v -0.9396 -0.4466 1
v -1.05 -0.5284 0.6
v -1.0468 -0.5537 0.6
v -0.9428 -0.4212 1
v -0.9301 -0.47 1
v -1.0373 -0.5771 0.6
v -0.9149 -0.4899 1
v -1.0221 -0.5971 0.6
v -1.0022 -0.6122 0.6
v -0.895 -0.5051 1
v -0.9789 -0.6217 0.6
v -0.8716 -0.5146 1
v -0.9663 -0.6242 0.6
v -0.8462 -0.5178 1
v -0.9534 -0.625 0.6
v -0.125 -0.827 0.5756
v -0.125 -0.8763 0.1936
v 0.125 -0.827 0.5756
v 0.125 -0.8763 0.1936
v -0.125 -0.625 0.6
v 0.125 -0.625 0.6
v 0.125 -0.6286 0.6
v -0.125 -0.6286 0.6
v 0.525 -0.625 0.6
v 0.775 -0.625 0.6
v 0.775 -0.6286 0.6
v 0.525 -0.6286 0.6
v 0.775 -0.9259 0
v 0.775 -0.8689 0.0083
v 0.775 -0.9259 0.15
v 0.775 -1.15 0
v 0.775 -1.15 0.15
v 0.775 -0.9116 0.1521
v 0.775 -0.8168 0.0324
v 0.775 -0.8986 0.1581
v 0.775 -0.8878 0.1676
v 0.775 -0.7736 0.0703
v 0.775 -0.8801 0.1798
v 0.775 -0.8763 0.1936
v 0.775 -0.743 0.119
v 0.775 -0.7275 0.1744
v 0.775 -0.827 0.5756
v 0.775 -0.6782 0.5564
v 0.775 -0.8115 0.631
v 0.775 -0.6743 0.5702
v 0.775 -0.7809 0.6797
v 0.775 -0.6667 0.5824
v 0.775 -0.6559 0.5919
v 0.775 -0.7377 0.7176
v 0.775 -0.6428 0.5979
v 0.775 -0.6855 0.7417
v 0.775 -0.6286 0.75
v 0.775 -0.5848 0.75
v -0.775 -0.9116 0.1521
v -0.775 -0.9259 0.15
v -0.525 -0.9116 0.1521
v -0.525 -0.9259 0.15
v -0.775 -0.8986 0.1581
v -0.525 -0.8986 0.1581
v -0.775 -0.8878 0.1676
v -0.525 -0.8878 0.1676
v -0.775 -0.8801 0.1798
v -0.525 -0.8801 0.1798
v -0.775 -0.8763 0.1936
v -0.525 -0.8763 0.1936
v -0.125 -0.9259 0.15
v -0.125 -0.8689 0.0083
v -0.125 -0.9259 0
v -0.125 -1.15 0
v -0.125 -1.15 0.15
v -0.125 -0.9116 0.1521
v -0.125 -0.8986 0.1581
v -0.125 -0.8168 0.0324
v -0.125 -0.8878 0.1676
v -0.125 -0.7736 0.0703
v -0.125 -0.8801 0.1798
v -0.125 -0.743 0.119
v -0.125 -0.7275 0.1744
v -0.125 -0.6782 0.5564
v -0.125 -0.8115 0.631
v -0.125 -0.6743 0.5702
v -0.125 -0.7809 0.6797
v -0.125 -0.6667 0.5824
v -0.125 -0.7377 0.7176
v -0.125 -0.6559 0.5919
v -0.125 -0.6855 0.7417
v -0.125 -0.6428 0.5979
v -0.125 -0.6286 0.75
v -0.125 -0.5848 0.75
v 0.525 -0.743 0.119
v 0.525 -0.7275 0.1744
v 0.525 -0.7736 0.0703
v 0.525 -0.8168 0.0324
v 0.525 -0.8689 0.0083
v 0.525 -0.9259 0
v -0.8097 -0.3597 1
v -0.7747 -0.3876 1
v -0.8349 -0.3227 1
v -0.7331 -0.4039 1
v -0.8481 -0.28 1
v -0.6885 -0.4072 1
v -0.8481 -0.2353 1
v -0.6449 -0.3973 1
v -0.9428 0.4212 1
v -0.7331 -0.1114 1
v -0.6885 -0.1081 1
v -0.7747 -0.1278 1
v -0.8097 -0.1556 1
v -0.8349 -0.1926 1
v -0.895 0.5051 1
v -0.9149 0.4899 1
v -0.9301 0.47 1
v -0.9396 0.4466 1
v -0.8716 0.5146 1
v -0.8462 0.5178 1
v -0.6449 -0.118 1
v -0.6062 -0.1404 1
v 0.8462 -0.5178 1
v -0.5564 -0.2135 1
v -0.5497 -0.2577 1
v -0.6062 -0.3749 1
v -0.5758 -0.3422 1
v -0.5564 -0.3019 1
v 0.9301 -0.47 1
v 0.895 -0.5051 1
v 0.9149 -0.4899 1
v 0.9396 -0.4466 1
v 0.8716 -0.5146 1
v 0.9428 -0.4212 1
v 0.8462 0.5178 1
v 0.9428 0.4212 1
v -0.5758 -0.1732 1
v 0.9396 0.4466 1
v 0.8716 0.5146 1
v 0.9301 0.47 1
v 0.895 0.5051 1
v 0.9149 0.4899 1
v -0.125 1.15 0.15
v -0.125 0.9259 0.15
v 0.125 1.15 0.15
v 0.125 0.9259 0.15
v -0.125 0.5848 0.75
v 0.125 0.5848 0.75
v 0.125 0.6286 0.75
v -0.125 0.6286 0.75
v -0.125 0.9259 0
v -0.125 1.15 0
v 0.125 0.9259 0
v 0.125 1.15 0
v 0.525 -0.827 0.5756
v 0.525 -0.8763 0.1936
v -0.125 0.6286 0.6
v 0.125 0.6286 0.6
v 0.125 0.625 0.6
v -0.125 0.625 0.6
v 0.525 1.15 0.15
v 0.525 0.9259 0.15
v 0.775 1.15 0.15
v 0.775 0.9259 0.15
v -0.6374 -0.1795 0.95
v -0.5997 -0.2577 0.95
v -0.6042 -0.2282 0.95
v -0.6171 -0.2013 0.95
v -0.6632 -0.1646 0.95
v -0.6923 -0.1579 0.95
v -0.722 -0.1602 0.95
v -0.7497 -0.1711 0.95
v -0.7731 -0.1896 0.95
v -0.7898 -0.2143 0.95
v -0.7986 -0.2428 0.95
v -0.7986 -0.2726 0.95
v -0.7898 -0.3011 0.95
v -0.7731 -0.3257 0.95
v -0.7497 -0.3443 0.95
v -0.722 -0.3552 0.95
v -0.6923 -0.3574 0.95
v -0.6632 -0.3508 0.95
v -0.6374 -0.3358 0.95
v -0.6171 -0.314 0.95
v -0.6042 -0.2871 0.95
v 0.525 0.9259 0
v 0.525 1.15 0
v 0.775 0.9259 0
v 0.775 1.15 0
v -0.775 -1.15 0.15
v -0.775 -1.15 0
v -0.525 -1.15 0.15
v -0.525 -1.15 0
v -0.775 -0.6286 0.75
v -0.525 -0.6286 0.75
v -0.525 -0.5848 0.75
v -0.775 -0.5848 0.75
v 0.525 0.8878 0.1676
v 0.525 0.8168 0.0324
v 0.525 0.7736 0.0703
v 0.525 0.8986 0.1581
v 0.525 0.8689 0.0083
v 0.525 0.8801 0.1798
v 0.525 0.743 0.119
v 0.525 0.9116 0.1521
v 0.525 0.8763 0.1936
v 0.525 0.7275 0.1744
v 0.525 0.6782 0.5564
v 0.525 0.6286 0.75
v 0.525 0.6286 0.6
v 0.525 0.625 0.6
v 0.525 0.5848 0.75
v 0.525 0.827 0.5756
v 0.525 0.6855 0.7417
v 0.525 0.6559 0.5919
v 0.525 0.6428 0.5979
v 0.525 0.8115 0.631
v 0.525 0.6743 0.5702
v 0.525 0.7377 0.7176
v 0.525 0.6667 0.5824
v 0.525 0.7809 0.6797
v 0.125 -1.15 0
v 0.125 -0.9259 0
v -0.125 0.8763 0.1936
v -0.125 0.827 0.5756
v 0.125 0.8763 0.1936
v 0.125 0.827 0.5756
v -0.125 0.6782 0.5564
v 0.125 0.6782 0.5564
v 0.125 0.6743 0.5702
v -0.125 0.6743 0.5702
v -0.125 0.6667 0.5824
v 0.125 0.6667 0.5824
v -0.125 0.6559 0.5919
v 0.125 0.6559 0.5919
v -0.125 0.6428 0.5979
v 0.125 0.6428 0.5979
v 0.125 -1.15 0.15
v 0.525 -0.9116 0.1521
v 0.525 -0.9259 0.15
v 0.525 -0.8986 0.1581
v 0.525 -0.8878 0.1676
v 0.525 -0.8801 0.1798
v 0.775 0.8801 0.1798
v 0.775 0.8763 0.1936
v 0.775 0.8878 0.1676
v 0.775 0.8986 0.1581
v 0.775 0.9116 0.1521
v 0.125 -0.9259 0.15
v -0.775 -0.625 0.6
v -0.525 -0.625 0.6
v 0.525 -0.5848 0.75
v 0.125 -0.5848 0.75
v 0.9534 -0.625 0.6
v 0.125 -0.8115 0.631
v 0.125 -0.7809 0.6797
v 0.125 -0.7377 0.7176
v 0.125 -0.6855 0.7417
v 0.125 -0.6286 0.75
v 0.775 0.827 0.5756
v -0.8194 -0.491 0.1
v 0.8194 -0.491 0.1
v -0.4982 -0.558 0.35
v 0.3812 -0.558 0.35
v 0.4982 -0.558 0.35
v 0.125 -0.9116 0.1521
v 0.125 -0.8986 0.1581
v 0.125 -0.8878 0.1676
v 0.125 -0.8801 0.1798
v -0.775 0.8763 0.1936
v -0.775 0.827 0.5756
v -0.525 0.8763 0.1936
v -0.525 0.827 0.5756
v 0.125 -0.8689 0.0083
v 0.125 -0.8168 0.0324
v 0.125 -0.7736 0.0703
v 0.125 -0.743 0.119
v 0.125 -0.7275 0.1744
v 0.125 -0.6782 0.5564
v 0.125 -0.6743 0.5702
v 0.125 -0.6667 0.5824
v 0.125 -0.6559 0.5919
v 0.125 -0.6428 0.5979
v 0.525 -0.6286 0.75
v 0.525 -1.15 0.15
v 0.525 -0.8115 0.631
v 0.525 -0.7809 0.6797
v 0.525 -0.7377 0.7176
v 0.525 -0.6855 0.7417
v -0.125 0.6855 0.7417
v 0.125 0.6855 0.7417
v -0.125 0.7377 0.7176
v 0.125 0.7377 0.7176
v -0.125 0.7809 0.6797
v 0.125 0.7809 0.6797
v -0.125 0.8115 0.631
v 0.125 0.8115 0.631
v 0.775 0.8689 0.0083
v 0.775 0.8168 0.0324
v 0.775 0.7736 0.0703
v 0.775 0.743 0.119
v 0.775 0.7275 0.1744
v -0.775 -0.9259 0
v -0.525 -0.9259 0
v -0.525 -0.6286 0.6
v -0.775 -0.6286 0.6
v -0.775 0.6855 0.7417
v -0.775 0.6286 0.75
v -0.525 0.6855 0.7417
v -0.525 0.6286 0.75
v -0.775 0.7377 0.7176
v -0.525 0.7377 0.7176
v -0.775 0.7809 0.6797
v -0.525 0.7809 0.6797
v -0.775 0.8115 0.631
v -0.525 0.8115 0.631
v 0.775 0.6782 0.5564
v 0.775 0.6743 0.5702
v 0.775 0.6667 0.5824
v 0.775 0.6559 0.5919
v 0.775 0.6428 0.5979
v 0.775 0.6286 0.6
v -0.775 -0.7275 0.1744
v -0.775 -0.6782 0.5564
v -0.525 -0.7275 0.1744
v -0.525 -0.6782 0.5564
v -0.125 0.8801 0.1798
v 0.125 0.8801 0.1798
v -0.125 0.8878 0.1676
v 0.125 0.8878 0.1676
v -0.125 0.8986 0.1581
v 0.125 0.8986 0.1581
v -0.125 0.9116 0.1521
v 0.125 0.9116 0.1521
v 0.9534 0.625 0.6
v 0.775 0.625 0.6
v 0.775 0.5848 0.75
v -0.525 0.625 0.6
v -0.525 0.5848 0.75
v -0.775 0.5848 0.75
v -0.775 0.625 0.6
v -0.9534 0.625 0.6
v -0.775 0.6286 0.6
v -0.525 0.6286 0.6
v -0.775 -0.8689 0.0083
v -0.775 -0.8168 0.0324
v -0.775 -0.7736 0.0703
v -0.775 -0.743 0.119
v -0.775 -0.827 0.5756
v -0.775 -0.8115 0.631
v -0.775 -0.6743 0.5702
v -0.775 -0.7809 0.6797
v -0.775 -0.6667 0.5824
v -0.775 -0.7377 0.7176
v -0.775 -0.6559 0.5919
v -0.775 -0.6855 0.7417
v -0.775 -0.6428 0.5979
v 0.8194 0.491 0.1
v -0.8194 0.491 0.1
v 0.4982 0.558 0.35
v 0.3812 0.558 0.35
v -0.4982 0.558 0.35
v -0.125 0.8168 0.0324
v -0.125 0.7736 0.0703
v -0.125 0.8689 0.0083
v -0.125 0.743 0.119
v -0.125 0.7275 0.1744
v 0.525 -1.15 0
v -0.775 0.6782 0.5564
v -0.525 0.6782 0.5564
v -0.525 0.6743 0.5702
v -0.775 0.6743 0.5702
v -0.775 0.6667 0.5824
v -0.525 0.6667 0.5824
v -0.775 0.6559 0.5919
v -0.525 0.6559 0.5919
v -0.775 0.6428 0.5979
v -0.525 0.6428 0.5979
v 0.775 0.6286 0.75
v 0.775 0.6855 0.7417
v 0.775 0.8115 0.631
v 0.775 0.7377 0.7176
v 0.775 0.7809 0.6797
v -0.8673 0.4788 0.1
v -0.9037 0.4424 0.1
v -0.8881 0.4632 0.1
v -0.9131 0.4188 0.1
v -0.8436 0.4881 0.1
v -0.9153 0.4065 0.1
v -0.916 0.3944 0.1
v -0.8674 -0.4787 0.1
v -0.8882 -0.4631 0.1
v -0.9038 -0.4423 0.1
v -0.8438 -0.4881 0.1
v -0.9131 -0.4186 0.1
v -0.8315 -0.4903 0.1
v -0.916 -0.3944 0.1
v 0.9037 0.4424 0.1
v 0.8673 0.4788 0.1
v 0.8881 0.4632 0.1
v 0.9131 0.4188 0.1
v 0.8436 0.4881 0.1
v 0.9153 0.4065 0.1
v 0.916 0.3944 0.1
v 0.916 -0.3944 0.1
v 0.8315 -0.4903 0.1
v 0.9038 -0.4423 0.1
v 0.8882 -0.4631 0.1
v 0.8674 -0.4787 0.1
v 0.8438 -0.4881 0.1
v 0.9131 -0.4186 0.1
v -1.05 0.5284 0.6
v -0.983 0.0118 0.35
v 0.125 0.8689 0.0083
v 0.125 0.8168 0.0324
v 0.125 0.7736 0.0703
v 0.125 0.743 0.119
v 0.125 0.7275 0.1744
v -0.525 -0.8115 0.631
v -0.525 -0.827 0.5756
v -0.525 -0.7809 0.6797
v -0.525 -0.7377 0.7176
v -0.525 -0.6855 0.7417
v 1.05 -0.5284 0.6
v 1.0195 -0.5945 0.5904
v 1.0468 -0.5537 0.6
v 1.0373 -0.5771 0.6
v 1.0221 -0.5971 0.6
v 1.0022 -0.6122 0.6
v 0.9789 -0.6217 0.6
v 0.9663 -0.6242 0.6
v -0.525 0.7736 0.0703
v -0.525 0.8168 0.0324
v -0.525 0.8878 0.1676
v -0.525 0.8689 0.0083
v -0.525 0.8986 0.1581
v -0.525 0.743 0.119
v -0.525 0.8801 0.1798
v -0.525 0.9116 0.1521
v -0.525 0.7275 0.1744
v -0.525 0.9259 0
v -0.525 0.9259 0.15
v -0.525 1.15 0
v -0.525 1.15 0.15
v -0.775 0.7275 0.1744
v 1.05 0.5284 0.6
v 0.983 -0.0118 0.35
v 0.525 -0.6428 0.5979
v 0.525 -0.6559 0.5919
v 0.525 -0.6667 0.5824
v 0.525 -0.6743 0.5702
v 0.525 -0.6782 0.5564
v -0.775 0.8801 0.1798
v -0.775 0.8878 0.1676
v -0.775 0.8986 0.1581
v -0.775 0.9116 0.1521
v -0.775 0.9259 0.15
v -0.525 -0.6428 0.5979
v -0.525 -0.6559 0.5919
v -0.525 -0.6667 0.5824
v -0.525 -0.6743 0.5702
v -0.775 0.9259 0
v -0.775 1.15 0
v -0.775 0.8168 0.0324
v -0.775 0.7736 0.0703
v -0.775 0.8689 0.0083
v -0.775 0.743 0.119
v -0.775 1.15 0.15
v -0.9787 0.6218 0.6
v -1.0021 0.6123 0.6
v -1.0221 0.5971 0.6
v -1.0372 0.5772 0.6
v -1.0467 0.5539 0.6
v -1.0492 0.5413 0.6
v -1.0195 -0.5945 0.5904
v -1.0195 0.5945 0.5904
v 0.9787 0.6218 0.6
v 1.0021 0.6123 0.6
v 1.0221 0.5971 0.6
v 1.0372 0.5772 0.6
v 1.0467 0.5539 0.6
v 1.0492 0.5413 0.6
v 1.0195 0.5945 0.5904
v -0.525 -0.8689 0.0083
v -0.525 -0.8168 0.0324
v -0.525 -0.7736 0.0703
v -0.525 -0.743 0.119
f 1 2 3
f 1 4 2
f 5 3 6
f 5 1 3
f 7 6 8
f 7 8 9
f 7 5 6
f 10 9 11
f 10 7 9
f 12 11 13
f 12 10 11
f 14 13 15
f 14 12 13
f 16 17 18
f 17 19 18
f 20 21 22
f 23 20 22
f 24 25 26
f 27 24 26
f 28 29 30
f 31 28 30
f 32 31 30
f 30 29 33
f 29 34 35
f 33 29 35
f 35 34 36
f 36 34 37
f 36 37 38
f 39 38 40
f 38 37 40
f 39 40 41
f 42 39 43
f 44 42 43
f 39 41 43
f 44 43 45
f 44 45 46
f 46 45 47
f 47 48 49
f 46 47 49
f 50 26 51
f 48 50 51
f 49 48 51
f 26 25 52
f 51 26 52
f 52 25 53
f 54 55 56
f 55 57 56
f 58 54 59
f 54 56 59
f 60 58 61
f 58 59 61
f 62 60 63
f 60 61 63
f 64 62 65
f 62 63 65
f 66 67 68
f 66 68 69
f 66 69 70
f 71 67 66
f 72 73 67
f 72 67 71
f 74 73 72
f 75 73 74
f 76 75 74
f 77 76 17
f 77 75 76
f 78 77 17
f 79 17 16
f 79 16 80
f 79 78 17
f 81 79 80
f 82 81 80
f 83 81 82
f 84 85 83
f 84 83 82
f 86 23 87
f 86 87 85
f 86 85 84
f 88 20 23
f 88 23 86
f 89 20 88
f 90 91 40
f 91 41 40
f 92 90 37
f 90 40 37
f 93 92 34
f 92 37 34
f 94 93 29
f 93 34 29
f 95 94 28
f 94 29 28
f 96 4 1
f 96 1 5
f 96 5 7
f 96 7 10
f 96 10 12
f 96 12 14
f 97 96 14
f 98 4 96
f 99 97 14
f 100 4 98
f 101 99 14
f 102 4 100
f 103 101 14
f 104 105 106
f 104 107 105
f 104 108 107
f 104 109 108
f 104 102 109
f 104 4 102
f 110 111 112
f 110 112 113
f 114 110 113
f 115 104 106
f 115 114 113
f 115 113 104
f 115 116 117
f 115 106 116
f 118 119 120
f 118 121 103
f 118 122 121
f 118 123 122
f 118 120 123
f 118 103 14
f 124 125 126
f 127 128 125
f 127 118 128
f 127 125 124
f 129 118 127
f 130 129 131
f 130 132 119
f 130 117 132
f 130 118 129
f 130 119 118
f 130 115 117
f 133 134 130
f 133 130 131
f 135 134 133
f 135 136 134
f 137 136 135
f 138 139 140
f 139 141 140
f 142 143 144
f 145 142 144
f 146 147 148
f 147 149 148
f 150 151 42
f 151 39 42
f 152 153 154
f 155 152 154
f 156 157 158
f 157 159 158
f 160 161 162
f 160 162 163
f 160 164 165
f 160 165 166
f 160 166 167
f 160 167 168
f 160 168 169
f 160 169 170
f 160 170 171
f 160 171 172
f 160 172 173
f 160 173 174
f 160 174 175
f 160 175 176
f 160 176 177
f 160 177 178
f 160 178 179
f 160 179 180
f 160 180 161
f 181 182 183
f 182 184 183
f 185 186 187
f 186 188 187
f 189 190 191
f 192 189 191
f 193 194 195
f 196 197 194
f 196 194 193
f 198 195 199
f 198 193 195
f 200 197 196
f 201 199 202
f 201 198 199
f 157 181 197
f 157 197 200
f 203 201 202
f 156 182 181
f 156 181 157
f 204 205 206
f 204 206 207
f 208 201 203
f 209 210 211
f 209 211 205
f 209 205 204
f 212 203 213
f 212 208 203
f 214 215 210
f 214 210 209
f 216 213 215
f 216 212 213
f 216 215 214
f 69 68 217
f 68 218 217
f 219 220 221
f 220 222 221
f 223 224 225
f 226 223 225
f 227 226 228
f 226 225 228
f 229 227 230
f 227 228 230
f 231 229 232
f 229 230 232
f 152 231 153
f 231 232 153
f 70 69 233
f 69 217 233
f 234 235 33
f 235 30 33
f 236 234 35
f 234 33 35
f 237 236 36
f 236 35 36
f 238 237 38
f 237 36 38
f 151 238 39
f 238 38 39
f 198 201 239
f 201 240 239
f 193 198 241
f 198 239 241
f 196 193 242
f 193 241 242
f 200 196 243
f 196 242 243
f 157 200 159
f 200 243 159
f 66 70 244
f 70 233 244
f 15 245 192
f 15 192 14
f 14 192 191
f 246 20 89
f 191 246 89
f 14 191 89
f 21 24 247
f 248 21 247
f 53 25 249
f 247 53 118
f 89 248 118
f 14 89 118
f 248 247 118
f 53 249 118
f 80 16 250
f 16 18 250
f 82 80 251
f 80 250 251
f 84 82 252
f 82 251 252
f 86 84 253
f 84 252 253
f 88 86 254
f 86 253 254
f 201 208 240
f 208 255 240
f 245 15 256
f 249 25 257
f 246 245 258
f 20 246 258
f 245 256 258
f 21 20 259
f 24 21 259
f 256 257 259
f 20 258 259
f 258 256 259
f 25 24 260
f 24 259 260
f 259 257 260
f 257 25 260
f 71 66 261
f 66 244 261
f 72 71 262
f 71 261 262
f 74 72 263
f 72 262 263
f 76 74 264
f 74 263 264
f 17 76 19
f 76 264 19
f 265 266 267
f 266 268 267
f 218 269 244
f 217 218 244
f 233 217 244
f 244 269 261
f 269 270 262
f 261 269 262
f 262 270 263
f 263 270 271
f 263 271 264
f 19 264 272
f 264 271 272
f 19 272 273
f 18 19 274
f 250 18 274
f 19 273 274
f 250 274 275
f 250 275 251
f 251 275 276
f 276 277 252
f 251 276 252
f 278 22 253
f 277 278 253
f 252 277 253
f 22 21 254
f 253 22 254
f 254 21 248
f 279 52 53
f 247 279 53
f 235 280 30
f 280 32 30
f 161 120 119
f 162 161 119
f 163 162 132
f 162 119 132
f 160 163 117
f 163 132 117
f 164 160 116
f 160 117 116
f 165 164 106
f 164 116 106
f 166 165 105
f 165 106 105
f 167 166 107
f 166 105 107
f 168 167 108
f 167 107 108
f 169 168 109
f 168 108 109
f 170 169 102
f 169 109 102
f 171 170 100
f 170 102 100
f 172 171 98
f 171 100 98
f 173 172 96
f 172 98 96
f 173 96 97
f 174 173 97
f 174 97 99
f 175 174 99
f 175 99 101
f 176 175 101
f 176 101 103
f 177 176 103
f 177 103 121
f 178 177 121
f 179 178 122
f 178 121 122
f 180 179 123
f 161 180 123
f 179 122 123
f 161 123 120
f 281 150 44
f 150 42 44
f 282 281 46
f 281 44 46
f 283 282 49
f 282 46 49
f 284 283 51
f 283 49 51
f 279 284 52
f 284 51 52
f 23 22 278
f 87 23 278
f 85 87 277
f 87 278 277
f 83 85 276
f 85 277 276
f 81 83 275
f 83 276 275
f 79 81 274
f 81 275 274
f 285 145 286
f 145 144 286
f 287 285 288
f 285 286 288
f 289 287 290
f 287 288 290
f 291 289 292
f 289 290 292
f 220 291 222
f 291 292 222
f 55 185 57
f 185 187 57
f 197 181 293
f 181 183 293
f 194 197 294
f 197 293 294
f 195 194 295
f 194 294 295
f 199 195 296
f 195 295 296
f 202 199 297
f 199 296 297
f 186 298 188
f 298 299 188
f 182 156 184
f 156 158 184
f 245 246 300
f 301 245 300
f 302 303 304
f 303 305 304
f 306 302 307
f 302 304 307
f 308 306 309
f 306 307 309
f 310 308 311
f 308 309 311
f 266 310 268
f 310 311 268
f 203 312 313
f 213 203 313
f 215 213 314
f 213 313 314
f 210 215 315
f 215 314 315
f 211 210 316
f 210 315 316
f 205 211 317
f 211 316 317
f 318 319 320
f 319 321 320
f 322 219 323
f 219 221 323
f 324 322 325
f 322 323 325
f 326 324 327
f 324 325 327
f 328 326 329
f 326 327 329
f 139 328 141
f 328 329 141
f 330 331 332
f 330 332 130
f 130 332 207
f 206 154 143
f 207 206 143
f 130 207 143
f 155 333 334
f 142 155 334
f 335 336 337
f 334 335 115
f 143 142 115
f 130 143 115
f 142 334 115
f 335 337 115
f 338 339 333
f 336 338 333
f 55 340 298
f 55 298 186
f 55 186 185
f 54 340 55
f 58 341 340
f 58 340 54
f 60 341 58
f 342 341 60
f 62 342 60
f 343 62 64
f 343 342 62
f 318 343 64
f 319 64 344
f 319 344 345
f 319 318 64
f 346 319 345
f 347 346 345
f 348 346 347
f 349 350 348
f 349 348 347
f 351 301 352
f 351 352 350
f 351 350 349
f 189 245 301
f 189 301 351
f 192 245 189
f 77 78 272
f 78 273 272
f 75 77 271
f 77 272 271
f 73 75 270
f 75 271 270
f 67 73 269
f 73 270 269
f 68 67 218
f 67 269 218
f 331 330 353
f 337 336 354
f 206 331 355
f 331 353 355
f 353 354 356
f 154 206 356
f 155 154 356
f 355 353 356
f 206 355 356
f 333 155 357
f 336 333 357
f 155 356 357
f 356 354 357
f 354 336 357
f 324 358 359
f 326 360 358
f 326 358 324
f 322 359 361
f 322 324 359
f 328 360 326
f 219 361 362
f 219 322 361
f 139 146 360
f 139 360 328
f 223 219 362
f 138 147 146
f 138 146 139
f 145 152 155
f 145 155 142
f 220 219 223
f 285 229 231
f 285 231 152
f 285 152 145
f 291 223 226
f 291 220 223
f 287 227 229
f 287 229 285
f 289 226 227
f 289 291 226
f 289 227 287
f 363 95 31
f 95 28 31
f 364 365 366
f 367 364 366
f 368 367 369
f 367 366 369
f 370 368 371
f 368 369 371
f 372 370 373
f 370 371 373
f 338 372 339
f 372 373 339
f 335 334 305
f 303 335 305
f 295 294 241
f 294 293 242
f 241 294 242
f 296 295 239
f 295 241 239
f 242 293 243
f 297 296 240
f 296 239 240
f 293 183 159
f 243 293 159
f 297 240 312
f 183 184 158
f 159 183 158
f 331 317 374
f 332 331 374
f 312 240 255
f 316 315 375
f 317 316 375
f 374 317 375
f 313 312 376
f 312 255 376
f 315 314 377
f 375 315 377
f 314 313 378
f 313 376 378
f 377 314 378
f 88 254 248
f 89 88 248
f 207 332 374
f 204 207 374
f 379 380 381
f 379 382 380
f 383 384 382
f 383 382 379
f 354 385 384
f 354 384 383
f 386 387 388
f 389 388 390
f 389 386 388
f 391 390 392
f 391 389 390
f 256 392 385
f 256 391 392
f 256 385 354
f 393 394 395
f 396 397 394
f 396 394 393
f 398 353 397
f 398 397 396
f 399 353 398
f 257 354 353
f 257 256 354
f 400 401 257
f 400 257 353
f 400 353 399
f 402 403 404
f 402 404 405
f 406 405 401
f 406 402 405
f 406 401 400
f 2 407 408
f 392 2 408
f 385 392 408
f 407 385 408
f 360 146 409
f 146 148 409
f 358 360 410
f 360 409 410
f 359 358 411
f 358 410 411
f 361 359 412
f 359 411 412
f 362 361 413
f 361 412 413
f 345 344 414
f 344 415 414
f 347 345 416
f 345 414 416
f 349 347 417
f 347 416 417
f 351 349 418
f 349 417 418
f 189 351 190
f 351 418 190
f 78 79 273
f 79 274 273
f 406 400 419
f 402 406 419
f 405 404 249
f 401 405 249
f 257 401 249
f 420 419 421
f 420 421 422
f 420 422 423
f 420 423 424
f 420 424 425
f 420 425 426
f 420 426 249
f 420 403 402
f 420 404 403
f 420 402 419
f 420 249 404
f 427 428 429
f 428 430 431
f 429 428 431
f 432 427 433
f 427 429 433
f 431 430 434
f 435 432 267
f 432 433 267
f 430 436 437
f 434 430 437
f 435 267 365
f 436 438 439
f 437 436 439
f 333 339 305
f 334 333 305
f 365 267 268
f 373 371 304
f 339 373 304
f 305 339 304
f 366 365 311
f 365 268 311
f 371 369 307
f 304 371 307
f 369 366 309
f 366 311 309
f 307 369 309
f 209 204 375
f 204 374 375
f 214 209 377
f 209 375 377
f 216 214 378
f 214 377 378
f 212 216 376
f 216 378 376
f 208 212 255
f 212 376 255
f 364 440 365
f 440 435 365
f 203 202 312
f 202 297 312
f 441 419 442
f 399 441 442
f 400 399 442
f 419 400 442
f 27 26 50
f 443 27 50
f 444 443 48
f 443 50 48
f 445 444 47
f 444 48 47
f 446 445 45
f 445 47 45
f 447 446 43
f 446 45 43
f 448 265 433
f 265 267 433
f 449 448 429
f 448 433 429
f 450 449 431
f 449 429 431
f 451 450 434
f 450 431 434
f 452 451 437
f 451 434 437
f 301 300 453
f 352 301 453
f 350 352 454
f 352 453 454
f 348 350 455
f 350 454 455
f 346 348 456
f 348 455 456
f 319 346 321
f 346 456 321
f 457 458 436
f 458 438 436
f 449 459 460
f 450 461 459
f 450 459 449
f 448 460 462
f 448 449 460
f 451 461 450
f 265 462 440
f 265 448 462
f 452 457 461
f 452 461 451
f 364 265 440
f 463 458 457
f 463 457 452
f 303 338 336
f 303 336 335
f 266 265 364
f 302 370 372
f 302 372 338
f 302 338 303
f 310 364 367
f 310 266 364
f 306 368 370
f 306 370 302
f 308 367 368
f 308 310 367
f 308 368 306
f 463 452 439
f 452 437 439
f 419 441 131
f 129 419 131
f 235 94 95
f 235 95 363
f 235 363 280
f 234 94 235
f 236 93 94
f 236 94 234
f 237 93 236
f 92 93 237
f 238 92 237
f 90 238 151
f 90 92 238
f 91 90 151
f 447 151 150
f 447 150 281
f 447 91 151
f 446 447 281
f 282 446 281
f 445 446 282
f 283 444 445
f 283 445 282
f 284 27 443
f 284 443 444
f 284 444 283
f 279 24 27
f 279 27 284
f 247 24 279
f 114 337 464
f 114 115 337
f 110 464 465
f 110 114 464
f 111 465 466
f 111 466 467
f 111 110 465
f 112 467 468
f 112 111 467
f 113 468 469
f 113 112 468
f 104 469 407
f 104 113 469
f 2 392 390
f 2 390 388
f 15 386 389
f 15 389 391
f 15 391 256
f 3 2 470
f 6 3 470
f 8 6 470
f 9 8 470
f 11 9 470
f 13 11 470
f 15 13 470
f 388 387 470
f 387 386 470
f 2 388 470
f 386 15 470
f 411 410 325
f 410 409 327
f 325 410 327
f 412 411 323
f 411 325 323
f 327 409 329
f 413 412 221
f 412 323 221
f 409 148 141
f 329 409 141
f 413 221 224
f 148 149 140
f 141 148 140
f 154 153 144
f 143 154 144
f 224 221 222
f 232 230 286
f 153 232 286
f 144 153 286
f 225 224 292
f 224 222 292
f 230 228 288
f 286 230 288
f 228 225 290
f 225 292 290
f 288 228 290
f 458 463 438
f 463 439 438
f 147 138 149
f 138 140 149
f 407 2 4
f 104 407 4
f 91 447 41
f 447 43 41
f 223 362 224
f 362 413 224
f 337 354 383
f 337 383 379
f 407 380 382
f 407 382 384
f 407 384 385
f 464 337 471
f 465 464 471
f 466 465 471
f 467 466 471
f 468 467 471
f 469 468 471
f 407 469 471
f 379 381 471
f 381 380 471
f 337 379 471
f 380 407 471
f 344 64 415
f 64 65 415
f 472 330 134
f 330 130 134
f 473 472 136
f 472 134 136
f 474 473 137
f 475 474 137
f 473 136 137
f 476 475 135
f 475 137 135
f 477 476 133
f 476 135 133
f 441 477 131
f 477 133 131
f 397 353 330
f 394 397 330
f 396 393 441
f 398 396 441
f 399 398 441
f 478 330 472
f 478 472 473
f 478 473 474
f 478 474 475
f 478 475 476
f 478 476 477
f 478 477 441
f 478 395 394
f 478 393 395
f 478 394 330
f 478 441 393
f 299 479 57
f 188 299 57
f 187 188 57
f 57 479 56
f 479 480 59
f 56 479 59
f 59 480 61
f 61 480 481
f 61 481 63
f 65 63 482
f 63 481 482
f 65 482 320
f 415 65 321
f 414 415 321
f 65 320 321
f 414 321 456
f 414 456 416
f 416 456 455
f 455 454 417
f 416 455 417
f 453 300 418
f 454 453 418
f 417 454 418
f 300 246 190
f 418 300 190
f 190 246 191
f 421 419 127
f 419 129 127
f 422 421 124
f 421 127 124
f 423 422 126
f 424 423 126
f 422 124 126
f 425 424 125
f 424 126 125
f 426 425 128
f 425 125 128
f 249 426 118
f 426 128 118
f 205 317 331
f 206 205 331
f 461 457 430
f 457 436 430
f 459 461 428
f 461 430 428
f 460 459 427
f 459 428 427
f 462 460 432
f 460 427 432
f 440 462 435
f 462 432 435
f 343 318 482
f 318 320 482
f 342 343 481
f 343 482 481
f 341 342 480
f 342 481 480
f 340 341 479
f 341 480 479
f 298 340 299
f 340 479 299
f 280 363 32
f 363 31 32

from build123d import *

# Parameters (mm, degrees)
EXTRUDE_START             = 0.6
SKETCH_1_W                = 2.1
SKETCH_1_H                = 1.25
EXTRUDE_1_DEPTH           = 0.4
EXTRUDE_1_TAPER           = 15
EXTRUDE_1_OTHER_WAY_DEPTH = 0.5
EXTRUDE_1_OTHER_WAY_TAPER = 15
EXTRUDE_START_2           = 0.65
EXTRUDE_4_DEPTH           = 0.125
EXTRUDE_5_DEPTH           = 0.125
PATTERN_LINEAR_2_COUNT    = 3
PATTERN_LINEAR_2_PITCH    = 0.65
PATTERN_LINEAR_3_COUNT    = 3
PATTERN_LINEAR_3_PITCH    = 0.65
FILLET_3_R                = 0.1
SKETCH_3_R                = 0.15
CUT_EXTRUDE_6_DEPTH       = 0.05
CUT_EXTRUDE_6_DRAFT       = -45


with BuildPart() as part:
    # Sketch 1 → Extrude 1 (new body)
    with BuildSketch(Plane.XY.offset(EXTRUDE_START)):
        Rectangle(SKETCH_1_W, SKETCH_1_H)
    extrude(amount=EXTRUDE_1_DEPTH, taper=EXTRUDE_1_TAPER)

    # Sketch 1 → Extrude 1 other way (add)
    with BuildSketch(Plane.XY.offset(EXTRUDE_START)):
        Rectangle(SKETCH_1_W, SKETCH_1_H)
    extrude(amount=-EXTRUDE_1_OTHER_WAY_DEPTH, taper=EXTRUDE_1_OTHER_WAY_TAPER)

    # Sketch 2 → Extrude 4 (add, symmetric)
    with BuildSketch(Plane(origin=(0, 0, 0), x_dir=(0, 0, -1), z_dir=(1, 0, 0)).offset(EXTRUDE_START_2)):
        with BuildLine():
            Line((-0.6, 0.55), (-0.75, 0.55))
            Line((-0.75, 0.55), (-0.75, 0.628617172))
            ThreePointArc((-0.75, 0.628617172), (-0.700198025, 0.760679859), (-0.575594468, 0.82697272))
            Line((-0.575594468, 0.82697272), (-0.193601383, 0.876262542))
            ThreePointArc((-0.193601383, 0.876262542), (-0.162450494, 0.892835757), (-0.15, 0.925851429))
            Line((-0.15, 0.925851429), (-0.15, 1.15))
            Line((-0.15, 1.15), (0, 1.15))
            Line((0, 1.15), (0, 0.925851429))
            ThreePointArc((0, 0.925851429), (-0.049801975, 0.793788742), (-0.174405532, 0.727495881))
            Line((-0.174405532, 0.727495881), (-0.556398617, 0.678206059))
            ThreePointArc((-0.556398617, 0.678206059), (-0.587549506, 0.661632844), (-0.6, 0.628617172))
            Line((-0.6, 0.628617172), (-0.6, 0.55))
        make_face()
    extrude_4 = extrude(amount=EXTRUDE_4_DEPTH, both=True)

    # Sketch 2_4 → Extrude 5 (add, symmetric)
    with BuildSketch(Plane(origin=(0, 0, 0), x_dir=(0, 0, -1), z_dir=(1, 0, 0)).offset(EXTRUDE_START_2)):
        with BuildLine():
            ThreePointArc((-0.6, -0.628617172), (-0.587549506, -0.661632844), (-0.556398617, -0.678206059))
            Line((-0.556398617, -0.678206059), (-0.174405532, -0.727495881))
            ThreePointArc((-0.174405532, -0.727495881), (-0.049801975, -0.793788742), (0, -0.925851429))
            Line((0, -0.925851429), (0, -1.15))
            Line((0, -1.15), (-0.15, -1.15))
            Line((-0.15, -1.15), (-0.15, -0.925851429))
            ThreePointArc((-0.15, -0.925851429), (-0.162450494, -0.892835757), (-0.193601383, -0.876262542))
            Line((-0.193601383, -0.876262542), (-0.575594468, -0.82697272))
            ThreePointArc((-0.575594468, -0.82697272), (-0.700198025, -0.760679859), (-0.75, -0.628617172))
            Line((-0.75, -0.628617172), (-0.75, -0.55))
            Line((-0.75, -0.55), (-0.6, -0.55))
            Line((-0.6, -0.55), (-0.6, -0.628617172))
        make_face()
    extrude_5 = extrude(amount=EXTRUDE_5_DEPTH, both=True)

    # Pattern Linear 2: Extrude 5 ×3
    with Locations(*[(-i * PATTERN_LINEAR_2_PITCH, 0, 0) for i in range(1, PATTERN_LINEAR_2_COUNT)]):
        add(extrude_5)

    # Pattern Linear 3: Extrude 4 ×3
    with Locations(*[(-i * PATTERN_LINEAR_3_PITCH, 0, 0) for i in range(1, PATTERN_LINEAR_3_COUNT)]):
        add(extrude_4)

    # Fillet 3
    fillet_3_edges = [part.edges().sort_by_distance(p)[0] for p in [
        (0.996410162, -0.571410162, 0.8),
        (0.996410162, 0.571410162, 0.8),
        (-0.996410162, 0.571410162, 0.8),
        (-0.996410162, -0.571410162, 0.8),
        (0.983012702, -0.558012702, 0.35),
        (-0.983012702, -0.558012702, 0.35),
        (-0.983012702, 0.558012702, 0.35),
        (0.983012702, 0.558012702, 0.35),
    ]]
    fillet(fillet_3_edges, radius=FILLET_3_R)


with BuildPart() as cut_extrude_6_tool:
    # Sketch 3 → Cut-Extrude 6 (with draft: the straight prism first)
    with BuildSketch(Plane.XY.offset(1)):
        with Locations((-0.69974874, -0.257664746)):
            Circle(SKETCH_3_R)
    extrude(amount=-CUT_EXTRUDE_6_DEPTH)
    # Cut-Extrude 6: the draft: its side faces are tilted about the plane it starts from
    cut_extrude_6_sides = [cut_extrude_6_tool.faces().sort_by_distance(p)[0] for p in [
        (-0.84974874, -0.257664746, 0.975),
    ]]
    draft(cut_extrude_6_sides, Plane.XY.offset(1), CUT_EXTRUDE_6_DRAFT)


with BuildPart() as part_1:
    add(part.part)

    # Cut-Extrude 6: cut by cut_extrude_6_tool
    add(cut_extrude_6_tool.part, mode=Mode.SUBTRACT)


solid = part_1.part
